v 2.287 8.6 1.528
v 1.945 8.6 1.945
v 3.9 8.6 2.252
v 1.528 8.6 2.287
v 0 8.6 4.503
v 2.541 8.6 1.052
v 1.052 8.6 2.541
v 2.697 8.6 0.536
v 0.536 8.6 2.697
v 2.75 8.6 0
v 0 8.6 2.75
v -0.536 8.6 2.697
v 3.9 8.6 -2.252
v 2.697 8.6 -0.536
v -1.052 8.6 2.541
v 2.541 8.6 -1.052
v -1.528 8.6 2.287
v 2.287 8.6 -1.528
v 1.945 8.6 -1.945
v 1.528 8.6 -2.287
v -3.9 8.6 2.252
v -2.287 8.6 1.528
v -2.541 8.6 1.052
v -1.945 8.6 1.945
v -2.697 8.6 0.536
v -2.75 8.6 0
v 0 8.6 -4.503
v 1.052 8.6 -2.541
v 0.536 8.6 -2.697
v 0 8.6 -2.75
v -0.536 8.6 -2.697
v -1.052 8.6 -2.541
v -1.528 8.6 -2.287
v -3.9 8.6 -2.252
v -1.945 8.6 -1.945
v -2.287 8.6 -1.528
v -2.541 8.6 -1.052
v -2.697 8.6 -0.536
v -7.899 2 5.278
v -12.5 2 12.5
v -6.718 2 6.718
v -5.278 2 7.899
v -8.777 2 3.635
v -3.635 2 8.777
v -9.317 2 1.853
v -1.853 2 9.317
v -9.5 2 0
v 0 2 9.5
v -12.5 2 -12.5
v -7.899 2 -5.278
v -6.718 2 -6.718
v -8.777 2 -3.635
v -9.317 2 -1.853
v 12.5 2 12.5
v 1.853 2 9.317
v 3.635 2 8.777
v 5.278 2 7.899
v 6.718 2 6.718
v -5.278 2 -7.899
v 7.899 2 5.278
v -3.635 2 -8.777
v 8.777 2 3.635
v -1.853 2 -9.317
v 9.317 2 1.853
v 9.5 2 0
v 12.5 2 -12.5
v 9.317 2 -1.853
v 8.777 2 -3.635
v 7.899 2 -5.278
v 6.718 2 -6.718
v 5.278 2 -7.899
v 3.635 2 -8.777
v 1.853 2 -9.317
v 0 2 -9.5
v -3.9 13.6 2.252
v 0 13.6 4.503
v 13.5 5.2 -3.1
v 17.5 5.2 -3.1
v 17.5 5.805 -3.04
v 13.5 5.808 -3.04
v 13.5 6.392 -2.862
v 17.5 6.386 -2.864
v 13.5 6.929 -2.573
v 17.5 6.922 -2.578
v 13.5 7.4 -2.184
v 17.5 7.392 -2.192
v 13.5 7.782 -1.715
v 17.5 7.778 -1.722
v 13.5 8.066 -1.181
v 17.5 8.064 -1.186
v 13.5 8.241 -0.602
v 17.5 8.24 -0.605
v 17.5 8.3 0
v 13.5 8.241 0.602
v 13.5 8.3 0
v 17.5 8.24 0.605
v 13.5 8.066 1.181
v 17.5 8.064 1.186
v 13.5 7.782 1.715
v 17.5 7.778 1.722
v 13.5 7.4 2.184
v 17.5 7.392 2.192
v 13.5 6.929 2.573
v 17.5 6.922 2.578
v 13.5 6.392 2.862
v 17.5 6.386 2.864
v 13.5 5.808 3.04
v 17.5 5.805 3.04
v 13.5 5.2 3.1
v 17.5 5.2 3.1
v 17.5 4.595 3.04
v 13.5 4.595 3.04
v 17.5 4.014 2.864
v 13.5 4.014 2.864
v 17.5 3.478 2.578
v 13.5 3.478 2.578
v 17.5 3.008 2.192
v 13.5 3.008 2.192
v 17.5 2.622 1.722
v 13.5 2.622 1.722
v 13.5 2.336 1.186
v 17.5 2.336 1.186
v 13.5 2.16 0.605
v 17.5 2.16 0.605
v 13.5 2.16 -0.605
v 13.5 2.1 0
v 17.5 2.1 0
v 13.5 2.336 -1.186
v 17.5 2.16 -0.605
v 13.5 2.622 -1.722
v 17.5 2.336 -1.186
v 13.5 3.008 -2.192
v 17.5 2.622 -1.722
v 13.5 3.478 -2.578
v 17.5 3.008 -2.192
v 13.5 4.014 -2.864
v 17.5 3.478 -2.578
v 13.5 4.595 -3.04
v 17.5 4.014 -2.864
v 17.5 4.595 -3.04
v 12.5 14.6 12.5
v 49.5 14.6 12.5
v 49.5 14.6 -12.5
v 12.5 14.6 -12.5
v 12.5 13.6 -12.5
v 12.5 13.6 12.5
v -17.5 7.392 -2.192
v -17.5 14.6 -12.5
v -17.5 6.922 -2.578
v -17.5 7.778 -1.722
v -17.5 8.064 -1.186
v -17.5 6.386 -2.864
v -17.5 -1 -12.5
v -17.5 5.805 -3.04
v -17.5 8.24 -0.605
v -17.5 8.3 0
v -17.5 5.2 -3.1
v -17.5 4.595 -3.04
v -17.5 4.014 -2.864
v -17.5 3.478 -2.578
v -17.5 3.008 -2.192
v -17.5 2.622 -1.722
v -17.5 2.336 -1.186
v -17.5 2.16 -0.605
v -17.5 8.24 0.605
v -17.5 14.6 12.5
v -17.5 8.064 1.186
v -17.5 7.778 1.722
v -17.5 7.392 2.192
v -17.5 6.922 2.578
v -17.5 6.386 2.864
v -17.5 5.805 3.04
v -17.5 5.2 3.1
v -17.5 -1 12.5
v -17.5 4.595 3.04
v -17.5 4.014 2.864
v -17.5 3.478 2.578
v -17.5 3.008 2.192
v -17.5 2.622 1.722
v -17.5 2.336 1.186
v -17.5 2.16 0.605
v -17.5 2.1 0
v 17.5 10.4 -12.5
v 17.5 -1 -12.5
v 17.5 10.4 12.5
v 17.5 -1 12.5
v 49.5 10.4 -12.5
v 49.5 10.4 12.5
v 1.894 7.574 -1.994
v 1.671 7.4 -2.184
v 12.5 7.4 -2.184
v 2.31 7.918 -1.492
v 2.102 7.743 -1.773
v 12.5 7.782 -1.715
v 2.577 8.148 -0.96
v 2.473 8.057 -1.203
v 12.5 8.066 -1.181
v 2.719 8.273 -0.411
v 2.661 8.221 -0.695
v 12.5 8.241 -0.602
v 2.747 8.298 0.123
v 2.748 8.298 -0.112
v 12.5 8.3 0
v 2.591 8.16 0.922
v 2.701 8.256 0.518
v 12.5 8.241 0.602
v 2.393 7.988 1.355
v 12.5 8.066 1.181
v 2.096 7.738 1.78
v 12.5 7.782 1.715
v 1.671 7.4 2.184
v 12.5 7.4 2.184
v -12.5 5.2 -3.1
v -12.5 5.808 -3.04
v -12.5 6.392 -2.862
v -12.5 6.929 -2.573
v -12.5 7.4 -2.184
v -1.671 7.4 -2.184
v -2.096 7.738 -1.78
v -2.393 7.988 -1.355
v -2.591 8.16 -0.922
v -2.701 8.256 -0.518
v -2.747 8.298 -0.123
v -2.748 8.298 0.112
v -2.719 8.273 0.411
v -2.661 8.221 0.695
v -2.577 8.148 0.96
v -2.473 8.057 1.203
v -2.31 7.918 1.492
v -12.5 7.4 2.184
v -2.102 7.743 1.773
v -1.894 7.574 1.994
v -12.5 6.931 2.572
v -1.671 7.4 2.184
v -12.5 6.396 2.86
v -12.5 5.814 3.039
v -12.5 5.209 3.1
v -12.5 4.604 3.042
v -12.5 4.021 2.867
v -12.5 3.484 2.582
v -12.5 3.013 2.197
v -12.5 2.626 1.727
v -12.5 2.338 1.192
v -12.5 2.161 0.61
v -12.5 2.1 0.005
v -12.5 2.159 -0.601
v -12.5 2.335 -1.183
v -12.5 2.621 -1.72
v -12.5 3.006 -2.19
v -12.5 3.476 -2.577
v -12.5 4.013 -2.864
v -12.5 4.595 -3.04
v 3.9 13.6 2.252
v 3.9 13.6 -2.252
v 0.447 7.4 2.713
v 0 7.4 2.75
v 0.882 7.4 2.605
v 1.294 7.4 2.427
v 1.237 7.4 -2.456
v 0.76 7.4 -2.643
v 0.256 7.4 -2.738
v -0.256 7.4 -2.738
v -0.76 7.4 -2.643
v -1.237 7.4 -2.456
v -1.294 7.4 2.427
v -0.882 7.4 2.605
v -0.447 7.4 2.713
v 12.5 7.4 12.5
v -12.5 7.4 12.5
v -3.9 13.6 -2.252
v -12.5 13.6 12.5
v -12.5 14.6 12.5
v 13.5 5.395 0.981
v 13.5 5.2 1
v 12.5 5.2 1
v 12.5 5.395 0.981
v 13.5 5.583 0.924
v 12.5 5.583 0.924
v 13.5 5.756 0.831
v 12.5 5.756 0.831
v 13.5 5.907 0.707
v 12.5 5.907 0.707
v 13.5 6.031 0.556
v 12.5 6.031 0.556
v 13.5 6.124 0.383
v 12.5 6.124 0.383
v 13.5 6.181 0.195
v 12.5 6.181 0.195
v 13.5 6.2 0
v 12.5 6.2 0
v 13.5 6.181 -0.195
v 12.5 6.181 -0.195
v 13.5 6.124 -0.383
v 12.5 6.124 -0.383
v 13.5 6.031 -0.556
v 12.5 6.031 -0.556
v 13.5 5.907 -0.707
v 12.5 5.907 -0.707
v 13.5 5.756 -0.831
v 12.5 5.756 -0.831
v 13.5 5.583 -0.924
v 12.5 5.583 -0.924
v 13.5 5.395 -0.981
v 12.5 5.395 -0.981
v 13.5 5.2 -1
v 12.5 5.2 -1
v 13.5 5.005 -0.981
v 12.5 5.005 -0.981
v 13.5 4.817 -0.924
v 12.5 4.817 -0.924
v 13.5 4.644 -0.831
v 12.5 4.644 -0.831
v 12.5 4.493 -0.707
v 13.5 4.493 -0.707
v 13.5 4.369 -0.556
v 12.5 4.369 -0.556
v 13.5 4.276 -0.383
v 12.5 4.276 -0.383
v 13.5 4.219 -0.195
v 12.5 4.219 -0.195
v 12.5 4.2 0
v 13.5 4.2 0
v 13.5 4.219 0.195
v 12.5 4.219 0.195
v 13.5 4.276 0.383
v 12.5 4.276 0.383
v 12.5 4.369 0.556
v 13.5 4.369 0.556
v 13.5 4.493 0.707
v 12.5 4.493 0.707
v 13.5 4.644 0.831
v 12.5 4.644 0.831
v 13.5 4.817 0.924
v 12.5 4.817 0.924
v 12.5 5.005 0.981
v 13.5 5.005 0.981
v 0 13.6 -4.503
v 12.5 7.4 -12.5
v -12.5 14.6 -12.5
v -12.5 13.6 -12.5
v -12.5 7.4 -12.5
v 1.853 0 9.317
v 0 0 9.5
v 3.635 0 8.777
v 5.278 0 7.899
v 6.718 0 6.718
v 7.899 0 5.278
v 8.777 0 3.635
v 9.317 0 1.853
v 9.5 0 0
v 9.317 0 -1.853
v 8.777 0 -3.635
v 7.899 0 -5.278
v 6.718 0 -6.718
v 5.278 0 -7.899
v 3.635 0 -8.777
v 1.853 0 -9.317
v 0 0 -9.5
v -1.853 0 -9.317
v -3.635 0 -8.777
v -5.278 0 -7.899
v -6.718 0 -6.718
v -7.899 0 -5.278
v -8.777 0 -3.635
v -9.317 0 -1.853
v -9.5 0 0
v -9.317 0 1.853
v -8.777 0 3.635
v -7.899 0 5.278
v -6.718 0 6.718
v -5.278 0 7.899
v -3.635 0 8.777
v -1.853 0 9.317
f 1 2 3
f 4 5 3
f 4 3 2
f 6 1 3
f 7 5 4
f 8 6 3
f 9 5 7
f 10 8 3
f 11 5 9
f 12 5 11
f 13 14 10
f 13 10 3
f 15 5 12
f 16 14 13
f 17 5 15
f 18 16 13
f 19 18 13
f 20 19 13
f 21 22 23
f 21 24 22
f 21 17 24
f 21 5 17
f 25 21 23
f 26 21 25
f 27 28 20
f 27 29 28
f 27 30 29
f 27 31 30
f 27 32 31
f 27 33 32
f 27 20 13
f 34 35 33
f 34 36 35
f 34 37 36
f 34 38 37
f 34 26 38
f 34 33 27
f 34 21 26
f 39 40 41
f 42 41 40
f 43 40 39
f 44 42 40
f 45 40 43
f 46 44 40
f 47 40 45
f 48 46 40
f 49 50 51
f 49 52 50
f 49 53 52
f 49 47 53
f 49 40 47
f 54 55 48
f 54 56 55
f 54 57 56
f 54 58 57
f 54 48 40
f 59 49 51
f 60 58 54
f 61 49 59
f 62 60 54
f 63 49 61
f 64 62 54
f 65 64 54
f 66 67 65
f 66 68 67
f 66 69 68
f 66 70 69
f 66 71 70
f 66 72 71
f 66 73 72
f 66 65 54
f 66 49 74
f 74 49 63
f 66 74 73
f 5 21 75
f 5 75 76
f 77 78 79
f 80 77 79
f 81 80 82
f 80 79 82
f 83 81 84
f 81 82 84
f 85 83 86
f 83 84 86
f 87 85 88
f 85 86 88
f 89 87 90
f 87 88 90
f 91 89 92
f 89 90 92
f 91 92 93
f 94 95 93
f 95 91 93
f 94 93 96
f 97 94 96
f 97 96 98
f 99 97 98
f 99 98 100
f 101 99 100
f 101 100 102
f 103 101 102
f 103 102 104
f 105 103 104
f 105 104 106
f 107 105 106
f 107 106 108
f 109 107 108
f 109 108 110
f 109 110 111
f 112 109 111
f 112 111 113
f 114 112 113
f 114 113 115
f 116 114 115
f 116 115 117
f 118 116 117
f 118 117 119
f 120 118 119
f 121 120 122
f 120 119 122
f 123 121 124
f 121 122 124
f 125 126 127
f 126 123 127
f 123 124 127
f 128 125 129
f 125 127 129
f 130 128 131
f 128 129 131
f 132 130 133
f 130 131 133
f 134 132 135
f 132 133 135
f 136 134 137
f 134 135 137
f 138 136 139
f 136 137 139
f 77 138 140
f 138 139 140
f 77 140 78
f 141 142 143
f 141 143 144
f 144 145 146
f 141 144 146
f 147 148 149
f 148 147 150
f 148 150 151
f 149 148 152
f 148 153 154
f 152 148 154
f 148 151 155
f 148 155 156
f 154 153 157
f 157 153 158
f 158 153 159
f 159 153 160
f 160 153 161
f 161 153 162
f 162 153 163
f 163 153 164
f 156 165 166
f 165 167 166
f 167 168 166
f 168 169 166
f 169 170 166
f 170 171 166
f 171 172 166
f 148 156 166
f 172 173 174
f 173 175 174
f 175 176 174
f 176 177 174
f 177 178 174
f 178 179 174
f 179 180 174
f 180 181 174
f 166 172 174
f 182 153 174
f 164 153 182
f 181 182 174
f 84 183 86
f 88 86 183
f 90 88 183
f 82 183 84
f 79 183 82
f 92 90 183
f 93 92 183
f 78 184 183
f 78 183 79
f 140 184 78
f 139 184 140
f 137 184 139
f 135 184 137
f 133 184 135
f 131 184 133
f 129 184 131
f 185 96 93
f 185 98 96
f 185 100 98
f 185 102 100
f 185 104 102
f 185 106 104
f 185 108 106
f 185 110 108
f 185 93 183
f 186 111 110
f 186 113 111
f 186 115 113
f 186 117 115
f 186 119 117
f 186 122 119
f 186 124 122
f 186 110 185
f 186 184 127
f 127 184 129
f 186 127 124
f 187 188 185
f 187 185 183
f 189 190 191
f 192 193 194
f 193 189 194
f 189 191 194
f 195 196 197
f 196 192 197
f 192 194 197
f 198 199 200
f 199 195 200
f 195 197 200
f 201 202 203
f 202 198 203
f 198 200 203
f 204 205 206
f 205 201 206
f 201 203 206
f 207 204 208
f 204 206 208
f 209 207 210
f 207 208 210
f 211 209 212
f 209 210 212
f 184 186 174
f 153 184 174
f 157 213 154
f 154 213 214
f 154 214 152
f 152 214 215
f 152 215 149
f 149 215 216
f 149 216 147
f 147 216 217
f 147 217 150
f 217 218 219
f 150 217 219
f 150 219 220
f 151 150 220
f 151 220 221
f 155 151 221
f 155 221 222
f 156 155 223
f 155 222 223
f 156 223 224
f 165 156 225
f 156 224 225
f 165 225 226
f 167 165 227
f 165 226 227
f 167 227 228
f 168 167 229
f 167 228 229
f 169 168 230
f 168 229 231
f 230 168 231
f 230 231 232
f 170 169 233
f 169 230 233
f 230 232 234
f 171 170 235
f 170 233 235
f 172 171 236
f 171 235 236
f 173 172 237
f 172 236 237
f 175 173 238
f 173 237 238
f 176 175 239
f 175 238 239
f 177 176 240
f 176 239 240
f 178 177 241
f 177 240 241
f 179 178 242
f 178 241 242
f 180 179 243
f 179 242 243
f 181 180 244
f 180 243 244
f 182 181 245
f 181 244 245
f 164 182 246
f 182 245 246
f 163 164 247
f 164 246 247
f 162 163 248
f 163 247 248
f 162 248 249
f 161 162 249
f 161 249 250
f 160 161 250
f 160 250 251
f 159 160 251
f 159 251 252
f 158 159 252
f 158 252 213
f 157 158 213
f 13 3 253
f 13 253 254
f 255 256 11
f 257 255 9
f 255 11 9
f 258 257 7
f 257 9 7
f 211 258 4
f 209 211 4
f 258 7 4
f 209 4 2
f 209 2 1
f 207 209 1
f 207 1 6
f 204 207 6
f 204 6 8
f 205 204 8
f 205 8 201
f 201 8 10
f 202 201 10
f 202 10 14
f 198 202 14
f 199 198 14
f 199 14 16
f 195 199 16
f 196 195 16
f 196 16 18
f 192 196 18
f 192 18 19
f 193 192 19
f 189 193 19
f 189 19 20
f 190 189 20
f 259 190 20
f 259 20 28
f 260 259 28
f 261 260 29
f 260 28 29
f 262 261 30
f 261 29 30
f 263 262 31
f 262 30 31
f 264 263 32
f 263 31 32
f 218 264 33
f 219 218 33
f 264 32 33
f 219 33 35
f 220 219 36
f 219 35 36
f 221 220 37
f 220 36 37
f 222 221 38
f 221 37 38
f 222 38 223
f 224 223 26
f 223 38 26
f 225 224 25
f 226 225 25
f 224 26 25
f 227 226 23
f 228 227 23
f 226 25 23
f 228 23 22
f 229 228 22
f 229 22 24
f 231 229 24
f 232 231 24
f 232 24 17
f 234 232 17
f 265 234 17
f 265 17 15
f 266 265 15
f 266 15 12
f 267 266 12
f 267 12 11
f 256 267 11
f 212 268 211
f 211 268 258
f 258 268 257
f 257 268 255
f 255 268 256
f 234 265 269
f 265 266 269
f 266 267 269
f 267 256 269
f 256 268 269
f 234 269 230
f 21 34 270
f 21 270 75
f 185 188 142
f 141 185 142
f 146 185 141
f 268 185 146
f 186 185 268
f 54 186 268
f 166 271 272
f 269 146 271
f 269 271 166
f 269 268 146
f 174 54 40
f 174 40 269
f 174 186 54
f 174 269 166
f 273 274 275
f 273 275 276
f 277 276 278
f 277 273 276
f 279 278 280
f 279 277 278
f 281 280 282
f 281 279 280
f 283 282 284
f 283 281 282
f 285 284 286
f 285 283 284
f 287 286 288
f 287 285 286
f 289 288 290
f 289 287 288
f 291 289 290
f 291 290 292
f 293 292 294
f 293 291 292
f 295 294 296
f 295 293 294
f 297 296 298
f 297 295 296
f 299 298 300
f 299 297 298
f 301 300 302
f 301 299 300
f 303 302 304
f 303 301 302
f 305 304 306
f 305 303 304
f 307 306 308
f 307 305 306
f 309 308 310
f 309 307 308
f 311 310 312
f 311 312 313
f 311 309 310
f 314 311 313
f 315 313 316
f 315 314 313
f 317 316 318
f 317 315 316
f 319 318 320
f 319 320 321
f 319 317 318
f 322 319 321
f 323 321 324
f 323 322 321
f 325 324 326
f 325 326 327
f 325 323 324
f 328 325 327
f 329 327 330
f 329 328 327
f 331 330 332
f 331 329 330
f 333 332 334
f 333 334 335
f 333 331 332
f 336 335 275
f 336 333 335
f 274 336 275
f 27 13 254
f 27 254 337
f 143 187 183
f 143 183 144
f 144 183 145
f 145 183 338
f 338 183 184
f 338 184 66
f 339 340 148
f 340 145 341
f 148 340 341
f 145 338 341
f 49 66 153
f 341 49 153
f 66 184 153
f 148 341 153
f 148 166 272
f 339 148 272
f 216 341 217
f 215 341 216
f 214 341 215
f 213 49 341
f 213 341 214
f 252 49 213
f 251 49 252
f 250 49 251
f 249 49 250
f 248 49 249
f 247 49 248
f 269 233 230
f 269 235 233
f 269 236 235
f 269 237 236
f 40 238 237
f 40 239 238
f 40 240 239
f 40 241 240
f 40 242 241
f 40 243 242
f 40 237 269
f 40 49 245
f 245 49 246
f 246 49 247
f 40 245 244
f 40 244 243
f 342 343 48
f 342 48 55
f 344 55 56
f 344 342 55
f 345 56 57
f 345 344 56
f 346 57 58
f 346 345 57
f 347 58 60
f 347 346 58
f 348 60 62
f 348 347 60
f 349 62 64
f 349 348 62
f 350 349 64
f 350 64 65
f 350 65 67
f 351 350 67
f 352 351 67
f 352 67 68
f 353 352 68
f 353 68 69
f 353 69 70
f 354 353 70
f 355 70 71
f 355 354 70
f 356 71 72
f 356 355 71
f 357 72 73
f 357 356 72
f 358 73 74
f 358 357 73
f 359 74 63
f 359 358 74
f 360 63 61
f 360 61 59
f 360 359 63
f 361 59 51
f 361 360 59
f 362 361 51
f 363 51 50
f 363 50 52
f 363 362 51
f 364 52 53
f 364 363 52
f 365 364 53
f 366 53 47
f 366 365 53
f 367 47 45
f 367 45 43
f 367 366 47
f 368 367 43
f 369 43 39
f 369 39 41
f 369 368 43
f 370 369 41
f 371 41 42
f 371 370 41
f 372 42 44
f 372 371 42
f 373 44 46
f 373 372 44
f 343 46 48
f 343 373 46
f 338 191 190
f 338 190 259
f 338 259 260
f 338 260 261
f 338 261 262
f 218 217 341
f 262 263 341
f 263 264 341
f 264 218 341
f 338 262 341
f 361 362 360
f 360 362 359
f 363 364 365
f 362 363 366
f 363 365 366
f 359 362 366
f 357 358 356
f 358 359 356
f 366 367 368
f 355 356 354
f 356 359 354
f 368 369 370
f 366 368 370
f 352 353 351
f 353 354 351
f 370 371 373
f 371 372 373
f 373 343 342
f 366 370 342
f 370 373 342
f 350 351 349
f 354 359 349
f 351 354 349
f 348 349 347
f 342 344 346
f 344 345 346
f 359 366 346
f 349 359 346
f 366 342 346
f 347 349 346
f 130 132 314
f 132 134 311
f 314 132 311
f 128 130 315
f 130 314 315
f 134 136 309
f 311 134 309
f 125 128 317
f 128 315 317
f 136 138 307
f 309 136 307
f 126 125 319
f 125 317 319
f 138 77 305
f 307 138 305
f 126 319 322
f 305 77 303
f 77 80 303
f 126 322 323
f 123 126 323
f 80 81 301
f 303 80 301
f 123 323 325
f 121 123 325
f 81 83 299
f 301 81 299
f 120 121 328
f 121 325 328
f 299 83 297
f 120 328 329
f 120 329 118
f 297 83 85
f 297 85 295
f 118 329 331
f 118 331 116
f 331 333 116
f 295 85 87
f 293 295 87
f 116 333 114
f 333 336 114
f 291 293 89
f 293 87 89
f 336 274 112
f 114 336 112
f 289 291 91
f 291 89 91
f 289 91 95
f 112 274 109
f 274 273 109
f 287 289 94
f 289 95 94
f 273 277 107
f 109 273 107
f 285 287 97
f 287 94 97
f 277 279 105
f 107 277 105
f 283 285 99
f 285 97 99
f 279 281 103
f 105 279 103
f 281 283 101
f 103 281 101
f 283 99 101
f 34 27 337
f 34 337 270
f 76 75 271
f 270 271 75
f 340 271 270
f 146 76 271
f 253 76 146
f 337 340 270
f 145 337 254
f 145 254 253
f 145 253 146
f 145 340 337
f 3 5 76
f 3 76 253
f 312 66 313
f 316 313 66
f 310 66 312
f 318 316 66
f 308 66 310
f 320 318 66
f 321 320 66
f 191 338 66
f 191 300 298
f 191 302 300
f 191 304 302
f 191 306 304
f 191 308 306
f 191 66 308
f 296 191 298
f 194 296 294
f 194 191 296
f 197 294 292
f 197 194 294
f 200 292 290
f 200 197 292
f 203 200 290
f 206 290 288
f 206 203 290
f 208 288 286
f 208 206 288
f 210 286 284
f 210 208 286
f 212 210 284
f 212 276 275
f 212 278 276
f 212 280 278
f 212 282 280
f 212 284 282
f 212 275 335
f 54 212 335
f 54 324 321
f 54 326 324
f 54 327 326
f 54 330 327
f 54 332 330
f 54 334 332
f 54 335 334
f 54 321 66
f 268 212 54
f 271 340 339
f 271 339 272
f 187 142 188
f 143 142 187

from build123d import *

# Parameters (mm, degrees)
SKETCH1_W              = 25
SKETCH1_H              = 25
SKETCH1_R              = 9.5
ALONGSIDE_WASHER_DEPTH = 2
SKETCH2_W              = 25
SKETCH2_H              = 25
BELOW_WASHER_DEPTH     = 1
SKETCH3_W              = 5
SKETCH3_H              = 25
UPRIGHT_1_DEPTH        = 15.6
SKETCH4_W              = 25
SKETCH4_H              = 1.2
BOSS_EXTRUDE4_DEPTH    = 25
SKETCH5_R              = 2.75
CUT_EXTRUDE1_DEPTH     = 1.2
BOSS_EXTRUDE5_START    = -1.2
SKETCH6_W              = 25
SKETCH6_H              = 25
BOSS_EXTRUDE5_DEPTH    = 6.2
SKETCH7_R              = 3.1
CUT_EXTRUDE2_DEPTH     = 40.930063862
SKETCH8_W              = 25
SKETCH8_H              = 4.2
BOSS_EXTRUDE6_DEPTH    = 37
BOSS_EXTRUDE7_START    = -1
SKETCH9_R              = 1
BOSS_EXTRUDE7_DEPTH    = 1


with BuildPart() as part:
    # Sketch1 → alongside washer (new body)
    with BuildSketch(Plane(origin=(0, 0, 0), x_dir=(1, 0, 0), z_dir=(0, 1, 0))):
        Rectangle(SKETCH1_W, SKETCH1_H)
        with Locations(Location((0, 0, 0), (0, 0, 270))):
            Circle(SKETCH1_R, mode=Mode.SUBTRACT)
    extrude(amount=ALONGSIDE_WASHER_DEPTH)

    # Sketch2 → below washer (add)
    with BuildSketch(Plane.XZ):
        Rectangle(SKETCH2_W, SKETCH2_H)
    extrude(amount=BELOW_WASHER_DEPTH)

    # Sketch3 → upright 1 (add)
    with BuildSketch(Plane.XZ.offset(1)):
        with Locations((-15, 0)):
            Rectangle(SKETCH3_W, SKETCH3_H)
    upright_1 = extrude(amount=-UPRIGHT_1_DEPTH)

    # Sketch4 → Boss-Extrude4 (add)
    with BuildSketch(Plane(origin=(-12.5, 0, 0), x_dir=(0, 0, -1), z_dir=(1, 0, 0))):
        with Locations((0, 8)):
            Rectangle(SKETCH4_W, SKETCH4_H)
    extrude(amount=BOSS_EXTRUDE4_DEPTH)

    # Sketch5 → Cut-Extrude1 (cut)
    with BuildSketch(Plane(origin=(0, 8.6, 0), x_dir=(1, 0, 0), z_dir=(0, 1, 0))):
        with Locations(Location((0, 0, 0), (0, 0, 270))):
            Circle(SKETCH5_R)
    extrude(amount=-CUT_EXTRUDE1_DEPTH, mode=Mode.SUBTRACT)

    # Sketch6 → Boss-Extrude5 (add)
    with BuildSketch(Plane(origin=(0, 8.6, 0), x_dir=(1, 0, 0), z_dir=(0, 1, 0)).offset(BOSS_EXTRUDE5_START)):
        Rectangle(SKETCH6_W, SKETCH6_H)
        Polygon((3.9, 2.25166605), (0, 4.5033321), (-3.9, 2.25166605), (-3.9, -2.25166605), (0, -4.5033321), (3.9, -2.25166605), align=None, mode=Mode.SUBTRACT)
    extrude(amount=BOSS_EXTRUDE5_DEPTH)

    # Mirror1: upright 1 across plane
    add(upright_1.mirror(Plane(origin=(0, 0, 0), x_dir=(0, 0, 1), z_dir=(1, 0, 0))))

    # Sketch7 → Cut-Extrude2 (cut, through all)
    with BuildSketch(Plane(origin=(17.5, 0, 0), x_dir=(0, 0, -1), z_dir=(1, 0, 0))):
        with Locations((0, 5.2)):
            Circle(SKETCH7_R)
    extrude(amount=-CUT_EXTRUDE2_DEPTH, mode=Mode.SUBTRACT)

    # Sketch8 → Boss-Extrude6 (add)
    with BuildSketch(Plane(origin=(12.5, 0, 0), x_dir=(0, 0, -1), z_dir=(1, 0, 0))):
        with Locations((0, 12.5)):
            Rectangle(SKETCH8_W, SKETCH8_H)
    extrude(amount=BOSS_EXTRUDE6_DEPTH)

    # Sketch9 → Boss-Extrude7 (add)
    with BuildSketch(Plane.ZY.offset(-12.5).offset(BOSS_EXTRUDE7_START)):
        with BuildLine():
            ThreePointArc((-2.184032967, 7.4), (-1.191532166, 2.338138526), (3.1, 5.2))
            ThreePointArc((3.1, 5.2), (2.861861474, 6.391532166), (2.184032967, 7.4))
            ThreePointArc((2.184032967, 7.4), (0, 8.3), (-2.184032967, 7.4))
        make_face()
        with Locations((0, 5.2)):
            Circle(SKETCH9_R, mode=Mode.SUBTRACT)
    extrude(amount=BOSS_EXTRUDE7_DEPTH)


solid = part.part
